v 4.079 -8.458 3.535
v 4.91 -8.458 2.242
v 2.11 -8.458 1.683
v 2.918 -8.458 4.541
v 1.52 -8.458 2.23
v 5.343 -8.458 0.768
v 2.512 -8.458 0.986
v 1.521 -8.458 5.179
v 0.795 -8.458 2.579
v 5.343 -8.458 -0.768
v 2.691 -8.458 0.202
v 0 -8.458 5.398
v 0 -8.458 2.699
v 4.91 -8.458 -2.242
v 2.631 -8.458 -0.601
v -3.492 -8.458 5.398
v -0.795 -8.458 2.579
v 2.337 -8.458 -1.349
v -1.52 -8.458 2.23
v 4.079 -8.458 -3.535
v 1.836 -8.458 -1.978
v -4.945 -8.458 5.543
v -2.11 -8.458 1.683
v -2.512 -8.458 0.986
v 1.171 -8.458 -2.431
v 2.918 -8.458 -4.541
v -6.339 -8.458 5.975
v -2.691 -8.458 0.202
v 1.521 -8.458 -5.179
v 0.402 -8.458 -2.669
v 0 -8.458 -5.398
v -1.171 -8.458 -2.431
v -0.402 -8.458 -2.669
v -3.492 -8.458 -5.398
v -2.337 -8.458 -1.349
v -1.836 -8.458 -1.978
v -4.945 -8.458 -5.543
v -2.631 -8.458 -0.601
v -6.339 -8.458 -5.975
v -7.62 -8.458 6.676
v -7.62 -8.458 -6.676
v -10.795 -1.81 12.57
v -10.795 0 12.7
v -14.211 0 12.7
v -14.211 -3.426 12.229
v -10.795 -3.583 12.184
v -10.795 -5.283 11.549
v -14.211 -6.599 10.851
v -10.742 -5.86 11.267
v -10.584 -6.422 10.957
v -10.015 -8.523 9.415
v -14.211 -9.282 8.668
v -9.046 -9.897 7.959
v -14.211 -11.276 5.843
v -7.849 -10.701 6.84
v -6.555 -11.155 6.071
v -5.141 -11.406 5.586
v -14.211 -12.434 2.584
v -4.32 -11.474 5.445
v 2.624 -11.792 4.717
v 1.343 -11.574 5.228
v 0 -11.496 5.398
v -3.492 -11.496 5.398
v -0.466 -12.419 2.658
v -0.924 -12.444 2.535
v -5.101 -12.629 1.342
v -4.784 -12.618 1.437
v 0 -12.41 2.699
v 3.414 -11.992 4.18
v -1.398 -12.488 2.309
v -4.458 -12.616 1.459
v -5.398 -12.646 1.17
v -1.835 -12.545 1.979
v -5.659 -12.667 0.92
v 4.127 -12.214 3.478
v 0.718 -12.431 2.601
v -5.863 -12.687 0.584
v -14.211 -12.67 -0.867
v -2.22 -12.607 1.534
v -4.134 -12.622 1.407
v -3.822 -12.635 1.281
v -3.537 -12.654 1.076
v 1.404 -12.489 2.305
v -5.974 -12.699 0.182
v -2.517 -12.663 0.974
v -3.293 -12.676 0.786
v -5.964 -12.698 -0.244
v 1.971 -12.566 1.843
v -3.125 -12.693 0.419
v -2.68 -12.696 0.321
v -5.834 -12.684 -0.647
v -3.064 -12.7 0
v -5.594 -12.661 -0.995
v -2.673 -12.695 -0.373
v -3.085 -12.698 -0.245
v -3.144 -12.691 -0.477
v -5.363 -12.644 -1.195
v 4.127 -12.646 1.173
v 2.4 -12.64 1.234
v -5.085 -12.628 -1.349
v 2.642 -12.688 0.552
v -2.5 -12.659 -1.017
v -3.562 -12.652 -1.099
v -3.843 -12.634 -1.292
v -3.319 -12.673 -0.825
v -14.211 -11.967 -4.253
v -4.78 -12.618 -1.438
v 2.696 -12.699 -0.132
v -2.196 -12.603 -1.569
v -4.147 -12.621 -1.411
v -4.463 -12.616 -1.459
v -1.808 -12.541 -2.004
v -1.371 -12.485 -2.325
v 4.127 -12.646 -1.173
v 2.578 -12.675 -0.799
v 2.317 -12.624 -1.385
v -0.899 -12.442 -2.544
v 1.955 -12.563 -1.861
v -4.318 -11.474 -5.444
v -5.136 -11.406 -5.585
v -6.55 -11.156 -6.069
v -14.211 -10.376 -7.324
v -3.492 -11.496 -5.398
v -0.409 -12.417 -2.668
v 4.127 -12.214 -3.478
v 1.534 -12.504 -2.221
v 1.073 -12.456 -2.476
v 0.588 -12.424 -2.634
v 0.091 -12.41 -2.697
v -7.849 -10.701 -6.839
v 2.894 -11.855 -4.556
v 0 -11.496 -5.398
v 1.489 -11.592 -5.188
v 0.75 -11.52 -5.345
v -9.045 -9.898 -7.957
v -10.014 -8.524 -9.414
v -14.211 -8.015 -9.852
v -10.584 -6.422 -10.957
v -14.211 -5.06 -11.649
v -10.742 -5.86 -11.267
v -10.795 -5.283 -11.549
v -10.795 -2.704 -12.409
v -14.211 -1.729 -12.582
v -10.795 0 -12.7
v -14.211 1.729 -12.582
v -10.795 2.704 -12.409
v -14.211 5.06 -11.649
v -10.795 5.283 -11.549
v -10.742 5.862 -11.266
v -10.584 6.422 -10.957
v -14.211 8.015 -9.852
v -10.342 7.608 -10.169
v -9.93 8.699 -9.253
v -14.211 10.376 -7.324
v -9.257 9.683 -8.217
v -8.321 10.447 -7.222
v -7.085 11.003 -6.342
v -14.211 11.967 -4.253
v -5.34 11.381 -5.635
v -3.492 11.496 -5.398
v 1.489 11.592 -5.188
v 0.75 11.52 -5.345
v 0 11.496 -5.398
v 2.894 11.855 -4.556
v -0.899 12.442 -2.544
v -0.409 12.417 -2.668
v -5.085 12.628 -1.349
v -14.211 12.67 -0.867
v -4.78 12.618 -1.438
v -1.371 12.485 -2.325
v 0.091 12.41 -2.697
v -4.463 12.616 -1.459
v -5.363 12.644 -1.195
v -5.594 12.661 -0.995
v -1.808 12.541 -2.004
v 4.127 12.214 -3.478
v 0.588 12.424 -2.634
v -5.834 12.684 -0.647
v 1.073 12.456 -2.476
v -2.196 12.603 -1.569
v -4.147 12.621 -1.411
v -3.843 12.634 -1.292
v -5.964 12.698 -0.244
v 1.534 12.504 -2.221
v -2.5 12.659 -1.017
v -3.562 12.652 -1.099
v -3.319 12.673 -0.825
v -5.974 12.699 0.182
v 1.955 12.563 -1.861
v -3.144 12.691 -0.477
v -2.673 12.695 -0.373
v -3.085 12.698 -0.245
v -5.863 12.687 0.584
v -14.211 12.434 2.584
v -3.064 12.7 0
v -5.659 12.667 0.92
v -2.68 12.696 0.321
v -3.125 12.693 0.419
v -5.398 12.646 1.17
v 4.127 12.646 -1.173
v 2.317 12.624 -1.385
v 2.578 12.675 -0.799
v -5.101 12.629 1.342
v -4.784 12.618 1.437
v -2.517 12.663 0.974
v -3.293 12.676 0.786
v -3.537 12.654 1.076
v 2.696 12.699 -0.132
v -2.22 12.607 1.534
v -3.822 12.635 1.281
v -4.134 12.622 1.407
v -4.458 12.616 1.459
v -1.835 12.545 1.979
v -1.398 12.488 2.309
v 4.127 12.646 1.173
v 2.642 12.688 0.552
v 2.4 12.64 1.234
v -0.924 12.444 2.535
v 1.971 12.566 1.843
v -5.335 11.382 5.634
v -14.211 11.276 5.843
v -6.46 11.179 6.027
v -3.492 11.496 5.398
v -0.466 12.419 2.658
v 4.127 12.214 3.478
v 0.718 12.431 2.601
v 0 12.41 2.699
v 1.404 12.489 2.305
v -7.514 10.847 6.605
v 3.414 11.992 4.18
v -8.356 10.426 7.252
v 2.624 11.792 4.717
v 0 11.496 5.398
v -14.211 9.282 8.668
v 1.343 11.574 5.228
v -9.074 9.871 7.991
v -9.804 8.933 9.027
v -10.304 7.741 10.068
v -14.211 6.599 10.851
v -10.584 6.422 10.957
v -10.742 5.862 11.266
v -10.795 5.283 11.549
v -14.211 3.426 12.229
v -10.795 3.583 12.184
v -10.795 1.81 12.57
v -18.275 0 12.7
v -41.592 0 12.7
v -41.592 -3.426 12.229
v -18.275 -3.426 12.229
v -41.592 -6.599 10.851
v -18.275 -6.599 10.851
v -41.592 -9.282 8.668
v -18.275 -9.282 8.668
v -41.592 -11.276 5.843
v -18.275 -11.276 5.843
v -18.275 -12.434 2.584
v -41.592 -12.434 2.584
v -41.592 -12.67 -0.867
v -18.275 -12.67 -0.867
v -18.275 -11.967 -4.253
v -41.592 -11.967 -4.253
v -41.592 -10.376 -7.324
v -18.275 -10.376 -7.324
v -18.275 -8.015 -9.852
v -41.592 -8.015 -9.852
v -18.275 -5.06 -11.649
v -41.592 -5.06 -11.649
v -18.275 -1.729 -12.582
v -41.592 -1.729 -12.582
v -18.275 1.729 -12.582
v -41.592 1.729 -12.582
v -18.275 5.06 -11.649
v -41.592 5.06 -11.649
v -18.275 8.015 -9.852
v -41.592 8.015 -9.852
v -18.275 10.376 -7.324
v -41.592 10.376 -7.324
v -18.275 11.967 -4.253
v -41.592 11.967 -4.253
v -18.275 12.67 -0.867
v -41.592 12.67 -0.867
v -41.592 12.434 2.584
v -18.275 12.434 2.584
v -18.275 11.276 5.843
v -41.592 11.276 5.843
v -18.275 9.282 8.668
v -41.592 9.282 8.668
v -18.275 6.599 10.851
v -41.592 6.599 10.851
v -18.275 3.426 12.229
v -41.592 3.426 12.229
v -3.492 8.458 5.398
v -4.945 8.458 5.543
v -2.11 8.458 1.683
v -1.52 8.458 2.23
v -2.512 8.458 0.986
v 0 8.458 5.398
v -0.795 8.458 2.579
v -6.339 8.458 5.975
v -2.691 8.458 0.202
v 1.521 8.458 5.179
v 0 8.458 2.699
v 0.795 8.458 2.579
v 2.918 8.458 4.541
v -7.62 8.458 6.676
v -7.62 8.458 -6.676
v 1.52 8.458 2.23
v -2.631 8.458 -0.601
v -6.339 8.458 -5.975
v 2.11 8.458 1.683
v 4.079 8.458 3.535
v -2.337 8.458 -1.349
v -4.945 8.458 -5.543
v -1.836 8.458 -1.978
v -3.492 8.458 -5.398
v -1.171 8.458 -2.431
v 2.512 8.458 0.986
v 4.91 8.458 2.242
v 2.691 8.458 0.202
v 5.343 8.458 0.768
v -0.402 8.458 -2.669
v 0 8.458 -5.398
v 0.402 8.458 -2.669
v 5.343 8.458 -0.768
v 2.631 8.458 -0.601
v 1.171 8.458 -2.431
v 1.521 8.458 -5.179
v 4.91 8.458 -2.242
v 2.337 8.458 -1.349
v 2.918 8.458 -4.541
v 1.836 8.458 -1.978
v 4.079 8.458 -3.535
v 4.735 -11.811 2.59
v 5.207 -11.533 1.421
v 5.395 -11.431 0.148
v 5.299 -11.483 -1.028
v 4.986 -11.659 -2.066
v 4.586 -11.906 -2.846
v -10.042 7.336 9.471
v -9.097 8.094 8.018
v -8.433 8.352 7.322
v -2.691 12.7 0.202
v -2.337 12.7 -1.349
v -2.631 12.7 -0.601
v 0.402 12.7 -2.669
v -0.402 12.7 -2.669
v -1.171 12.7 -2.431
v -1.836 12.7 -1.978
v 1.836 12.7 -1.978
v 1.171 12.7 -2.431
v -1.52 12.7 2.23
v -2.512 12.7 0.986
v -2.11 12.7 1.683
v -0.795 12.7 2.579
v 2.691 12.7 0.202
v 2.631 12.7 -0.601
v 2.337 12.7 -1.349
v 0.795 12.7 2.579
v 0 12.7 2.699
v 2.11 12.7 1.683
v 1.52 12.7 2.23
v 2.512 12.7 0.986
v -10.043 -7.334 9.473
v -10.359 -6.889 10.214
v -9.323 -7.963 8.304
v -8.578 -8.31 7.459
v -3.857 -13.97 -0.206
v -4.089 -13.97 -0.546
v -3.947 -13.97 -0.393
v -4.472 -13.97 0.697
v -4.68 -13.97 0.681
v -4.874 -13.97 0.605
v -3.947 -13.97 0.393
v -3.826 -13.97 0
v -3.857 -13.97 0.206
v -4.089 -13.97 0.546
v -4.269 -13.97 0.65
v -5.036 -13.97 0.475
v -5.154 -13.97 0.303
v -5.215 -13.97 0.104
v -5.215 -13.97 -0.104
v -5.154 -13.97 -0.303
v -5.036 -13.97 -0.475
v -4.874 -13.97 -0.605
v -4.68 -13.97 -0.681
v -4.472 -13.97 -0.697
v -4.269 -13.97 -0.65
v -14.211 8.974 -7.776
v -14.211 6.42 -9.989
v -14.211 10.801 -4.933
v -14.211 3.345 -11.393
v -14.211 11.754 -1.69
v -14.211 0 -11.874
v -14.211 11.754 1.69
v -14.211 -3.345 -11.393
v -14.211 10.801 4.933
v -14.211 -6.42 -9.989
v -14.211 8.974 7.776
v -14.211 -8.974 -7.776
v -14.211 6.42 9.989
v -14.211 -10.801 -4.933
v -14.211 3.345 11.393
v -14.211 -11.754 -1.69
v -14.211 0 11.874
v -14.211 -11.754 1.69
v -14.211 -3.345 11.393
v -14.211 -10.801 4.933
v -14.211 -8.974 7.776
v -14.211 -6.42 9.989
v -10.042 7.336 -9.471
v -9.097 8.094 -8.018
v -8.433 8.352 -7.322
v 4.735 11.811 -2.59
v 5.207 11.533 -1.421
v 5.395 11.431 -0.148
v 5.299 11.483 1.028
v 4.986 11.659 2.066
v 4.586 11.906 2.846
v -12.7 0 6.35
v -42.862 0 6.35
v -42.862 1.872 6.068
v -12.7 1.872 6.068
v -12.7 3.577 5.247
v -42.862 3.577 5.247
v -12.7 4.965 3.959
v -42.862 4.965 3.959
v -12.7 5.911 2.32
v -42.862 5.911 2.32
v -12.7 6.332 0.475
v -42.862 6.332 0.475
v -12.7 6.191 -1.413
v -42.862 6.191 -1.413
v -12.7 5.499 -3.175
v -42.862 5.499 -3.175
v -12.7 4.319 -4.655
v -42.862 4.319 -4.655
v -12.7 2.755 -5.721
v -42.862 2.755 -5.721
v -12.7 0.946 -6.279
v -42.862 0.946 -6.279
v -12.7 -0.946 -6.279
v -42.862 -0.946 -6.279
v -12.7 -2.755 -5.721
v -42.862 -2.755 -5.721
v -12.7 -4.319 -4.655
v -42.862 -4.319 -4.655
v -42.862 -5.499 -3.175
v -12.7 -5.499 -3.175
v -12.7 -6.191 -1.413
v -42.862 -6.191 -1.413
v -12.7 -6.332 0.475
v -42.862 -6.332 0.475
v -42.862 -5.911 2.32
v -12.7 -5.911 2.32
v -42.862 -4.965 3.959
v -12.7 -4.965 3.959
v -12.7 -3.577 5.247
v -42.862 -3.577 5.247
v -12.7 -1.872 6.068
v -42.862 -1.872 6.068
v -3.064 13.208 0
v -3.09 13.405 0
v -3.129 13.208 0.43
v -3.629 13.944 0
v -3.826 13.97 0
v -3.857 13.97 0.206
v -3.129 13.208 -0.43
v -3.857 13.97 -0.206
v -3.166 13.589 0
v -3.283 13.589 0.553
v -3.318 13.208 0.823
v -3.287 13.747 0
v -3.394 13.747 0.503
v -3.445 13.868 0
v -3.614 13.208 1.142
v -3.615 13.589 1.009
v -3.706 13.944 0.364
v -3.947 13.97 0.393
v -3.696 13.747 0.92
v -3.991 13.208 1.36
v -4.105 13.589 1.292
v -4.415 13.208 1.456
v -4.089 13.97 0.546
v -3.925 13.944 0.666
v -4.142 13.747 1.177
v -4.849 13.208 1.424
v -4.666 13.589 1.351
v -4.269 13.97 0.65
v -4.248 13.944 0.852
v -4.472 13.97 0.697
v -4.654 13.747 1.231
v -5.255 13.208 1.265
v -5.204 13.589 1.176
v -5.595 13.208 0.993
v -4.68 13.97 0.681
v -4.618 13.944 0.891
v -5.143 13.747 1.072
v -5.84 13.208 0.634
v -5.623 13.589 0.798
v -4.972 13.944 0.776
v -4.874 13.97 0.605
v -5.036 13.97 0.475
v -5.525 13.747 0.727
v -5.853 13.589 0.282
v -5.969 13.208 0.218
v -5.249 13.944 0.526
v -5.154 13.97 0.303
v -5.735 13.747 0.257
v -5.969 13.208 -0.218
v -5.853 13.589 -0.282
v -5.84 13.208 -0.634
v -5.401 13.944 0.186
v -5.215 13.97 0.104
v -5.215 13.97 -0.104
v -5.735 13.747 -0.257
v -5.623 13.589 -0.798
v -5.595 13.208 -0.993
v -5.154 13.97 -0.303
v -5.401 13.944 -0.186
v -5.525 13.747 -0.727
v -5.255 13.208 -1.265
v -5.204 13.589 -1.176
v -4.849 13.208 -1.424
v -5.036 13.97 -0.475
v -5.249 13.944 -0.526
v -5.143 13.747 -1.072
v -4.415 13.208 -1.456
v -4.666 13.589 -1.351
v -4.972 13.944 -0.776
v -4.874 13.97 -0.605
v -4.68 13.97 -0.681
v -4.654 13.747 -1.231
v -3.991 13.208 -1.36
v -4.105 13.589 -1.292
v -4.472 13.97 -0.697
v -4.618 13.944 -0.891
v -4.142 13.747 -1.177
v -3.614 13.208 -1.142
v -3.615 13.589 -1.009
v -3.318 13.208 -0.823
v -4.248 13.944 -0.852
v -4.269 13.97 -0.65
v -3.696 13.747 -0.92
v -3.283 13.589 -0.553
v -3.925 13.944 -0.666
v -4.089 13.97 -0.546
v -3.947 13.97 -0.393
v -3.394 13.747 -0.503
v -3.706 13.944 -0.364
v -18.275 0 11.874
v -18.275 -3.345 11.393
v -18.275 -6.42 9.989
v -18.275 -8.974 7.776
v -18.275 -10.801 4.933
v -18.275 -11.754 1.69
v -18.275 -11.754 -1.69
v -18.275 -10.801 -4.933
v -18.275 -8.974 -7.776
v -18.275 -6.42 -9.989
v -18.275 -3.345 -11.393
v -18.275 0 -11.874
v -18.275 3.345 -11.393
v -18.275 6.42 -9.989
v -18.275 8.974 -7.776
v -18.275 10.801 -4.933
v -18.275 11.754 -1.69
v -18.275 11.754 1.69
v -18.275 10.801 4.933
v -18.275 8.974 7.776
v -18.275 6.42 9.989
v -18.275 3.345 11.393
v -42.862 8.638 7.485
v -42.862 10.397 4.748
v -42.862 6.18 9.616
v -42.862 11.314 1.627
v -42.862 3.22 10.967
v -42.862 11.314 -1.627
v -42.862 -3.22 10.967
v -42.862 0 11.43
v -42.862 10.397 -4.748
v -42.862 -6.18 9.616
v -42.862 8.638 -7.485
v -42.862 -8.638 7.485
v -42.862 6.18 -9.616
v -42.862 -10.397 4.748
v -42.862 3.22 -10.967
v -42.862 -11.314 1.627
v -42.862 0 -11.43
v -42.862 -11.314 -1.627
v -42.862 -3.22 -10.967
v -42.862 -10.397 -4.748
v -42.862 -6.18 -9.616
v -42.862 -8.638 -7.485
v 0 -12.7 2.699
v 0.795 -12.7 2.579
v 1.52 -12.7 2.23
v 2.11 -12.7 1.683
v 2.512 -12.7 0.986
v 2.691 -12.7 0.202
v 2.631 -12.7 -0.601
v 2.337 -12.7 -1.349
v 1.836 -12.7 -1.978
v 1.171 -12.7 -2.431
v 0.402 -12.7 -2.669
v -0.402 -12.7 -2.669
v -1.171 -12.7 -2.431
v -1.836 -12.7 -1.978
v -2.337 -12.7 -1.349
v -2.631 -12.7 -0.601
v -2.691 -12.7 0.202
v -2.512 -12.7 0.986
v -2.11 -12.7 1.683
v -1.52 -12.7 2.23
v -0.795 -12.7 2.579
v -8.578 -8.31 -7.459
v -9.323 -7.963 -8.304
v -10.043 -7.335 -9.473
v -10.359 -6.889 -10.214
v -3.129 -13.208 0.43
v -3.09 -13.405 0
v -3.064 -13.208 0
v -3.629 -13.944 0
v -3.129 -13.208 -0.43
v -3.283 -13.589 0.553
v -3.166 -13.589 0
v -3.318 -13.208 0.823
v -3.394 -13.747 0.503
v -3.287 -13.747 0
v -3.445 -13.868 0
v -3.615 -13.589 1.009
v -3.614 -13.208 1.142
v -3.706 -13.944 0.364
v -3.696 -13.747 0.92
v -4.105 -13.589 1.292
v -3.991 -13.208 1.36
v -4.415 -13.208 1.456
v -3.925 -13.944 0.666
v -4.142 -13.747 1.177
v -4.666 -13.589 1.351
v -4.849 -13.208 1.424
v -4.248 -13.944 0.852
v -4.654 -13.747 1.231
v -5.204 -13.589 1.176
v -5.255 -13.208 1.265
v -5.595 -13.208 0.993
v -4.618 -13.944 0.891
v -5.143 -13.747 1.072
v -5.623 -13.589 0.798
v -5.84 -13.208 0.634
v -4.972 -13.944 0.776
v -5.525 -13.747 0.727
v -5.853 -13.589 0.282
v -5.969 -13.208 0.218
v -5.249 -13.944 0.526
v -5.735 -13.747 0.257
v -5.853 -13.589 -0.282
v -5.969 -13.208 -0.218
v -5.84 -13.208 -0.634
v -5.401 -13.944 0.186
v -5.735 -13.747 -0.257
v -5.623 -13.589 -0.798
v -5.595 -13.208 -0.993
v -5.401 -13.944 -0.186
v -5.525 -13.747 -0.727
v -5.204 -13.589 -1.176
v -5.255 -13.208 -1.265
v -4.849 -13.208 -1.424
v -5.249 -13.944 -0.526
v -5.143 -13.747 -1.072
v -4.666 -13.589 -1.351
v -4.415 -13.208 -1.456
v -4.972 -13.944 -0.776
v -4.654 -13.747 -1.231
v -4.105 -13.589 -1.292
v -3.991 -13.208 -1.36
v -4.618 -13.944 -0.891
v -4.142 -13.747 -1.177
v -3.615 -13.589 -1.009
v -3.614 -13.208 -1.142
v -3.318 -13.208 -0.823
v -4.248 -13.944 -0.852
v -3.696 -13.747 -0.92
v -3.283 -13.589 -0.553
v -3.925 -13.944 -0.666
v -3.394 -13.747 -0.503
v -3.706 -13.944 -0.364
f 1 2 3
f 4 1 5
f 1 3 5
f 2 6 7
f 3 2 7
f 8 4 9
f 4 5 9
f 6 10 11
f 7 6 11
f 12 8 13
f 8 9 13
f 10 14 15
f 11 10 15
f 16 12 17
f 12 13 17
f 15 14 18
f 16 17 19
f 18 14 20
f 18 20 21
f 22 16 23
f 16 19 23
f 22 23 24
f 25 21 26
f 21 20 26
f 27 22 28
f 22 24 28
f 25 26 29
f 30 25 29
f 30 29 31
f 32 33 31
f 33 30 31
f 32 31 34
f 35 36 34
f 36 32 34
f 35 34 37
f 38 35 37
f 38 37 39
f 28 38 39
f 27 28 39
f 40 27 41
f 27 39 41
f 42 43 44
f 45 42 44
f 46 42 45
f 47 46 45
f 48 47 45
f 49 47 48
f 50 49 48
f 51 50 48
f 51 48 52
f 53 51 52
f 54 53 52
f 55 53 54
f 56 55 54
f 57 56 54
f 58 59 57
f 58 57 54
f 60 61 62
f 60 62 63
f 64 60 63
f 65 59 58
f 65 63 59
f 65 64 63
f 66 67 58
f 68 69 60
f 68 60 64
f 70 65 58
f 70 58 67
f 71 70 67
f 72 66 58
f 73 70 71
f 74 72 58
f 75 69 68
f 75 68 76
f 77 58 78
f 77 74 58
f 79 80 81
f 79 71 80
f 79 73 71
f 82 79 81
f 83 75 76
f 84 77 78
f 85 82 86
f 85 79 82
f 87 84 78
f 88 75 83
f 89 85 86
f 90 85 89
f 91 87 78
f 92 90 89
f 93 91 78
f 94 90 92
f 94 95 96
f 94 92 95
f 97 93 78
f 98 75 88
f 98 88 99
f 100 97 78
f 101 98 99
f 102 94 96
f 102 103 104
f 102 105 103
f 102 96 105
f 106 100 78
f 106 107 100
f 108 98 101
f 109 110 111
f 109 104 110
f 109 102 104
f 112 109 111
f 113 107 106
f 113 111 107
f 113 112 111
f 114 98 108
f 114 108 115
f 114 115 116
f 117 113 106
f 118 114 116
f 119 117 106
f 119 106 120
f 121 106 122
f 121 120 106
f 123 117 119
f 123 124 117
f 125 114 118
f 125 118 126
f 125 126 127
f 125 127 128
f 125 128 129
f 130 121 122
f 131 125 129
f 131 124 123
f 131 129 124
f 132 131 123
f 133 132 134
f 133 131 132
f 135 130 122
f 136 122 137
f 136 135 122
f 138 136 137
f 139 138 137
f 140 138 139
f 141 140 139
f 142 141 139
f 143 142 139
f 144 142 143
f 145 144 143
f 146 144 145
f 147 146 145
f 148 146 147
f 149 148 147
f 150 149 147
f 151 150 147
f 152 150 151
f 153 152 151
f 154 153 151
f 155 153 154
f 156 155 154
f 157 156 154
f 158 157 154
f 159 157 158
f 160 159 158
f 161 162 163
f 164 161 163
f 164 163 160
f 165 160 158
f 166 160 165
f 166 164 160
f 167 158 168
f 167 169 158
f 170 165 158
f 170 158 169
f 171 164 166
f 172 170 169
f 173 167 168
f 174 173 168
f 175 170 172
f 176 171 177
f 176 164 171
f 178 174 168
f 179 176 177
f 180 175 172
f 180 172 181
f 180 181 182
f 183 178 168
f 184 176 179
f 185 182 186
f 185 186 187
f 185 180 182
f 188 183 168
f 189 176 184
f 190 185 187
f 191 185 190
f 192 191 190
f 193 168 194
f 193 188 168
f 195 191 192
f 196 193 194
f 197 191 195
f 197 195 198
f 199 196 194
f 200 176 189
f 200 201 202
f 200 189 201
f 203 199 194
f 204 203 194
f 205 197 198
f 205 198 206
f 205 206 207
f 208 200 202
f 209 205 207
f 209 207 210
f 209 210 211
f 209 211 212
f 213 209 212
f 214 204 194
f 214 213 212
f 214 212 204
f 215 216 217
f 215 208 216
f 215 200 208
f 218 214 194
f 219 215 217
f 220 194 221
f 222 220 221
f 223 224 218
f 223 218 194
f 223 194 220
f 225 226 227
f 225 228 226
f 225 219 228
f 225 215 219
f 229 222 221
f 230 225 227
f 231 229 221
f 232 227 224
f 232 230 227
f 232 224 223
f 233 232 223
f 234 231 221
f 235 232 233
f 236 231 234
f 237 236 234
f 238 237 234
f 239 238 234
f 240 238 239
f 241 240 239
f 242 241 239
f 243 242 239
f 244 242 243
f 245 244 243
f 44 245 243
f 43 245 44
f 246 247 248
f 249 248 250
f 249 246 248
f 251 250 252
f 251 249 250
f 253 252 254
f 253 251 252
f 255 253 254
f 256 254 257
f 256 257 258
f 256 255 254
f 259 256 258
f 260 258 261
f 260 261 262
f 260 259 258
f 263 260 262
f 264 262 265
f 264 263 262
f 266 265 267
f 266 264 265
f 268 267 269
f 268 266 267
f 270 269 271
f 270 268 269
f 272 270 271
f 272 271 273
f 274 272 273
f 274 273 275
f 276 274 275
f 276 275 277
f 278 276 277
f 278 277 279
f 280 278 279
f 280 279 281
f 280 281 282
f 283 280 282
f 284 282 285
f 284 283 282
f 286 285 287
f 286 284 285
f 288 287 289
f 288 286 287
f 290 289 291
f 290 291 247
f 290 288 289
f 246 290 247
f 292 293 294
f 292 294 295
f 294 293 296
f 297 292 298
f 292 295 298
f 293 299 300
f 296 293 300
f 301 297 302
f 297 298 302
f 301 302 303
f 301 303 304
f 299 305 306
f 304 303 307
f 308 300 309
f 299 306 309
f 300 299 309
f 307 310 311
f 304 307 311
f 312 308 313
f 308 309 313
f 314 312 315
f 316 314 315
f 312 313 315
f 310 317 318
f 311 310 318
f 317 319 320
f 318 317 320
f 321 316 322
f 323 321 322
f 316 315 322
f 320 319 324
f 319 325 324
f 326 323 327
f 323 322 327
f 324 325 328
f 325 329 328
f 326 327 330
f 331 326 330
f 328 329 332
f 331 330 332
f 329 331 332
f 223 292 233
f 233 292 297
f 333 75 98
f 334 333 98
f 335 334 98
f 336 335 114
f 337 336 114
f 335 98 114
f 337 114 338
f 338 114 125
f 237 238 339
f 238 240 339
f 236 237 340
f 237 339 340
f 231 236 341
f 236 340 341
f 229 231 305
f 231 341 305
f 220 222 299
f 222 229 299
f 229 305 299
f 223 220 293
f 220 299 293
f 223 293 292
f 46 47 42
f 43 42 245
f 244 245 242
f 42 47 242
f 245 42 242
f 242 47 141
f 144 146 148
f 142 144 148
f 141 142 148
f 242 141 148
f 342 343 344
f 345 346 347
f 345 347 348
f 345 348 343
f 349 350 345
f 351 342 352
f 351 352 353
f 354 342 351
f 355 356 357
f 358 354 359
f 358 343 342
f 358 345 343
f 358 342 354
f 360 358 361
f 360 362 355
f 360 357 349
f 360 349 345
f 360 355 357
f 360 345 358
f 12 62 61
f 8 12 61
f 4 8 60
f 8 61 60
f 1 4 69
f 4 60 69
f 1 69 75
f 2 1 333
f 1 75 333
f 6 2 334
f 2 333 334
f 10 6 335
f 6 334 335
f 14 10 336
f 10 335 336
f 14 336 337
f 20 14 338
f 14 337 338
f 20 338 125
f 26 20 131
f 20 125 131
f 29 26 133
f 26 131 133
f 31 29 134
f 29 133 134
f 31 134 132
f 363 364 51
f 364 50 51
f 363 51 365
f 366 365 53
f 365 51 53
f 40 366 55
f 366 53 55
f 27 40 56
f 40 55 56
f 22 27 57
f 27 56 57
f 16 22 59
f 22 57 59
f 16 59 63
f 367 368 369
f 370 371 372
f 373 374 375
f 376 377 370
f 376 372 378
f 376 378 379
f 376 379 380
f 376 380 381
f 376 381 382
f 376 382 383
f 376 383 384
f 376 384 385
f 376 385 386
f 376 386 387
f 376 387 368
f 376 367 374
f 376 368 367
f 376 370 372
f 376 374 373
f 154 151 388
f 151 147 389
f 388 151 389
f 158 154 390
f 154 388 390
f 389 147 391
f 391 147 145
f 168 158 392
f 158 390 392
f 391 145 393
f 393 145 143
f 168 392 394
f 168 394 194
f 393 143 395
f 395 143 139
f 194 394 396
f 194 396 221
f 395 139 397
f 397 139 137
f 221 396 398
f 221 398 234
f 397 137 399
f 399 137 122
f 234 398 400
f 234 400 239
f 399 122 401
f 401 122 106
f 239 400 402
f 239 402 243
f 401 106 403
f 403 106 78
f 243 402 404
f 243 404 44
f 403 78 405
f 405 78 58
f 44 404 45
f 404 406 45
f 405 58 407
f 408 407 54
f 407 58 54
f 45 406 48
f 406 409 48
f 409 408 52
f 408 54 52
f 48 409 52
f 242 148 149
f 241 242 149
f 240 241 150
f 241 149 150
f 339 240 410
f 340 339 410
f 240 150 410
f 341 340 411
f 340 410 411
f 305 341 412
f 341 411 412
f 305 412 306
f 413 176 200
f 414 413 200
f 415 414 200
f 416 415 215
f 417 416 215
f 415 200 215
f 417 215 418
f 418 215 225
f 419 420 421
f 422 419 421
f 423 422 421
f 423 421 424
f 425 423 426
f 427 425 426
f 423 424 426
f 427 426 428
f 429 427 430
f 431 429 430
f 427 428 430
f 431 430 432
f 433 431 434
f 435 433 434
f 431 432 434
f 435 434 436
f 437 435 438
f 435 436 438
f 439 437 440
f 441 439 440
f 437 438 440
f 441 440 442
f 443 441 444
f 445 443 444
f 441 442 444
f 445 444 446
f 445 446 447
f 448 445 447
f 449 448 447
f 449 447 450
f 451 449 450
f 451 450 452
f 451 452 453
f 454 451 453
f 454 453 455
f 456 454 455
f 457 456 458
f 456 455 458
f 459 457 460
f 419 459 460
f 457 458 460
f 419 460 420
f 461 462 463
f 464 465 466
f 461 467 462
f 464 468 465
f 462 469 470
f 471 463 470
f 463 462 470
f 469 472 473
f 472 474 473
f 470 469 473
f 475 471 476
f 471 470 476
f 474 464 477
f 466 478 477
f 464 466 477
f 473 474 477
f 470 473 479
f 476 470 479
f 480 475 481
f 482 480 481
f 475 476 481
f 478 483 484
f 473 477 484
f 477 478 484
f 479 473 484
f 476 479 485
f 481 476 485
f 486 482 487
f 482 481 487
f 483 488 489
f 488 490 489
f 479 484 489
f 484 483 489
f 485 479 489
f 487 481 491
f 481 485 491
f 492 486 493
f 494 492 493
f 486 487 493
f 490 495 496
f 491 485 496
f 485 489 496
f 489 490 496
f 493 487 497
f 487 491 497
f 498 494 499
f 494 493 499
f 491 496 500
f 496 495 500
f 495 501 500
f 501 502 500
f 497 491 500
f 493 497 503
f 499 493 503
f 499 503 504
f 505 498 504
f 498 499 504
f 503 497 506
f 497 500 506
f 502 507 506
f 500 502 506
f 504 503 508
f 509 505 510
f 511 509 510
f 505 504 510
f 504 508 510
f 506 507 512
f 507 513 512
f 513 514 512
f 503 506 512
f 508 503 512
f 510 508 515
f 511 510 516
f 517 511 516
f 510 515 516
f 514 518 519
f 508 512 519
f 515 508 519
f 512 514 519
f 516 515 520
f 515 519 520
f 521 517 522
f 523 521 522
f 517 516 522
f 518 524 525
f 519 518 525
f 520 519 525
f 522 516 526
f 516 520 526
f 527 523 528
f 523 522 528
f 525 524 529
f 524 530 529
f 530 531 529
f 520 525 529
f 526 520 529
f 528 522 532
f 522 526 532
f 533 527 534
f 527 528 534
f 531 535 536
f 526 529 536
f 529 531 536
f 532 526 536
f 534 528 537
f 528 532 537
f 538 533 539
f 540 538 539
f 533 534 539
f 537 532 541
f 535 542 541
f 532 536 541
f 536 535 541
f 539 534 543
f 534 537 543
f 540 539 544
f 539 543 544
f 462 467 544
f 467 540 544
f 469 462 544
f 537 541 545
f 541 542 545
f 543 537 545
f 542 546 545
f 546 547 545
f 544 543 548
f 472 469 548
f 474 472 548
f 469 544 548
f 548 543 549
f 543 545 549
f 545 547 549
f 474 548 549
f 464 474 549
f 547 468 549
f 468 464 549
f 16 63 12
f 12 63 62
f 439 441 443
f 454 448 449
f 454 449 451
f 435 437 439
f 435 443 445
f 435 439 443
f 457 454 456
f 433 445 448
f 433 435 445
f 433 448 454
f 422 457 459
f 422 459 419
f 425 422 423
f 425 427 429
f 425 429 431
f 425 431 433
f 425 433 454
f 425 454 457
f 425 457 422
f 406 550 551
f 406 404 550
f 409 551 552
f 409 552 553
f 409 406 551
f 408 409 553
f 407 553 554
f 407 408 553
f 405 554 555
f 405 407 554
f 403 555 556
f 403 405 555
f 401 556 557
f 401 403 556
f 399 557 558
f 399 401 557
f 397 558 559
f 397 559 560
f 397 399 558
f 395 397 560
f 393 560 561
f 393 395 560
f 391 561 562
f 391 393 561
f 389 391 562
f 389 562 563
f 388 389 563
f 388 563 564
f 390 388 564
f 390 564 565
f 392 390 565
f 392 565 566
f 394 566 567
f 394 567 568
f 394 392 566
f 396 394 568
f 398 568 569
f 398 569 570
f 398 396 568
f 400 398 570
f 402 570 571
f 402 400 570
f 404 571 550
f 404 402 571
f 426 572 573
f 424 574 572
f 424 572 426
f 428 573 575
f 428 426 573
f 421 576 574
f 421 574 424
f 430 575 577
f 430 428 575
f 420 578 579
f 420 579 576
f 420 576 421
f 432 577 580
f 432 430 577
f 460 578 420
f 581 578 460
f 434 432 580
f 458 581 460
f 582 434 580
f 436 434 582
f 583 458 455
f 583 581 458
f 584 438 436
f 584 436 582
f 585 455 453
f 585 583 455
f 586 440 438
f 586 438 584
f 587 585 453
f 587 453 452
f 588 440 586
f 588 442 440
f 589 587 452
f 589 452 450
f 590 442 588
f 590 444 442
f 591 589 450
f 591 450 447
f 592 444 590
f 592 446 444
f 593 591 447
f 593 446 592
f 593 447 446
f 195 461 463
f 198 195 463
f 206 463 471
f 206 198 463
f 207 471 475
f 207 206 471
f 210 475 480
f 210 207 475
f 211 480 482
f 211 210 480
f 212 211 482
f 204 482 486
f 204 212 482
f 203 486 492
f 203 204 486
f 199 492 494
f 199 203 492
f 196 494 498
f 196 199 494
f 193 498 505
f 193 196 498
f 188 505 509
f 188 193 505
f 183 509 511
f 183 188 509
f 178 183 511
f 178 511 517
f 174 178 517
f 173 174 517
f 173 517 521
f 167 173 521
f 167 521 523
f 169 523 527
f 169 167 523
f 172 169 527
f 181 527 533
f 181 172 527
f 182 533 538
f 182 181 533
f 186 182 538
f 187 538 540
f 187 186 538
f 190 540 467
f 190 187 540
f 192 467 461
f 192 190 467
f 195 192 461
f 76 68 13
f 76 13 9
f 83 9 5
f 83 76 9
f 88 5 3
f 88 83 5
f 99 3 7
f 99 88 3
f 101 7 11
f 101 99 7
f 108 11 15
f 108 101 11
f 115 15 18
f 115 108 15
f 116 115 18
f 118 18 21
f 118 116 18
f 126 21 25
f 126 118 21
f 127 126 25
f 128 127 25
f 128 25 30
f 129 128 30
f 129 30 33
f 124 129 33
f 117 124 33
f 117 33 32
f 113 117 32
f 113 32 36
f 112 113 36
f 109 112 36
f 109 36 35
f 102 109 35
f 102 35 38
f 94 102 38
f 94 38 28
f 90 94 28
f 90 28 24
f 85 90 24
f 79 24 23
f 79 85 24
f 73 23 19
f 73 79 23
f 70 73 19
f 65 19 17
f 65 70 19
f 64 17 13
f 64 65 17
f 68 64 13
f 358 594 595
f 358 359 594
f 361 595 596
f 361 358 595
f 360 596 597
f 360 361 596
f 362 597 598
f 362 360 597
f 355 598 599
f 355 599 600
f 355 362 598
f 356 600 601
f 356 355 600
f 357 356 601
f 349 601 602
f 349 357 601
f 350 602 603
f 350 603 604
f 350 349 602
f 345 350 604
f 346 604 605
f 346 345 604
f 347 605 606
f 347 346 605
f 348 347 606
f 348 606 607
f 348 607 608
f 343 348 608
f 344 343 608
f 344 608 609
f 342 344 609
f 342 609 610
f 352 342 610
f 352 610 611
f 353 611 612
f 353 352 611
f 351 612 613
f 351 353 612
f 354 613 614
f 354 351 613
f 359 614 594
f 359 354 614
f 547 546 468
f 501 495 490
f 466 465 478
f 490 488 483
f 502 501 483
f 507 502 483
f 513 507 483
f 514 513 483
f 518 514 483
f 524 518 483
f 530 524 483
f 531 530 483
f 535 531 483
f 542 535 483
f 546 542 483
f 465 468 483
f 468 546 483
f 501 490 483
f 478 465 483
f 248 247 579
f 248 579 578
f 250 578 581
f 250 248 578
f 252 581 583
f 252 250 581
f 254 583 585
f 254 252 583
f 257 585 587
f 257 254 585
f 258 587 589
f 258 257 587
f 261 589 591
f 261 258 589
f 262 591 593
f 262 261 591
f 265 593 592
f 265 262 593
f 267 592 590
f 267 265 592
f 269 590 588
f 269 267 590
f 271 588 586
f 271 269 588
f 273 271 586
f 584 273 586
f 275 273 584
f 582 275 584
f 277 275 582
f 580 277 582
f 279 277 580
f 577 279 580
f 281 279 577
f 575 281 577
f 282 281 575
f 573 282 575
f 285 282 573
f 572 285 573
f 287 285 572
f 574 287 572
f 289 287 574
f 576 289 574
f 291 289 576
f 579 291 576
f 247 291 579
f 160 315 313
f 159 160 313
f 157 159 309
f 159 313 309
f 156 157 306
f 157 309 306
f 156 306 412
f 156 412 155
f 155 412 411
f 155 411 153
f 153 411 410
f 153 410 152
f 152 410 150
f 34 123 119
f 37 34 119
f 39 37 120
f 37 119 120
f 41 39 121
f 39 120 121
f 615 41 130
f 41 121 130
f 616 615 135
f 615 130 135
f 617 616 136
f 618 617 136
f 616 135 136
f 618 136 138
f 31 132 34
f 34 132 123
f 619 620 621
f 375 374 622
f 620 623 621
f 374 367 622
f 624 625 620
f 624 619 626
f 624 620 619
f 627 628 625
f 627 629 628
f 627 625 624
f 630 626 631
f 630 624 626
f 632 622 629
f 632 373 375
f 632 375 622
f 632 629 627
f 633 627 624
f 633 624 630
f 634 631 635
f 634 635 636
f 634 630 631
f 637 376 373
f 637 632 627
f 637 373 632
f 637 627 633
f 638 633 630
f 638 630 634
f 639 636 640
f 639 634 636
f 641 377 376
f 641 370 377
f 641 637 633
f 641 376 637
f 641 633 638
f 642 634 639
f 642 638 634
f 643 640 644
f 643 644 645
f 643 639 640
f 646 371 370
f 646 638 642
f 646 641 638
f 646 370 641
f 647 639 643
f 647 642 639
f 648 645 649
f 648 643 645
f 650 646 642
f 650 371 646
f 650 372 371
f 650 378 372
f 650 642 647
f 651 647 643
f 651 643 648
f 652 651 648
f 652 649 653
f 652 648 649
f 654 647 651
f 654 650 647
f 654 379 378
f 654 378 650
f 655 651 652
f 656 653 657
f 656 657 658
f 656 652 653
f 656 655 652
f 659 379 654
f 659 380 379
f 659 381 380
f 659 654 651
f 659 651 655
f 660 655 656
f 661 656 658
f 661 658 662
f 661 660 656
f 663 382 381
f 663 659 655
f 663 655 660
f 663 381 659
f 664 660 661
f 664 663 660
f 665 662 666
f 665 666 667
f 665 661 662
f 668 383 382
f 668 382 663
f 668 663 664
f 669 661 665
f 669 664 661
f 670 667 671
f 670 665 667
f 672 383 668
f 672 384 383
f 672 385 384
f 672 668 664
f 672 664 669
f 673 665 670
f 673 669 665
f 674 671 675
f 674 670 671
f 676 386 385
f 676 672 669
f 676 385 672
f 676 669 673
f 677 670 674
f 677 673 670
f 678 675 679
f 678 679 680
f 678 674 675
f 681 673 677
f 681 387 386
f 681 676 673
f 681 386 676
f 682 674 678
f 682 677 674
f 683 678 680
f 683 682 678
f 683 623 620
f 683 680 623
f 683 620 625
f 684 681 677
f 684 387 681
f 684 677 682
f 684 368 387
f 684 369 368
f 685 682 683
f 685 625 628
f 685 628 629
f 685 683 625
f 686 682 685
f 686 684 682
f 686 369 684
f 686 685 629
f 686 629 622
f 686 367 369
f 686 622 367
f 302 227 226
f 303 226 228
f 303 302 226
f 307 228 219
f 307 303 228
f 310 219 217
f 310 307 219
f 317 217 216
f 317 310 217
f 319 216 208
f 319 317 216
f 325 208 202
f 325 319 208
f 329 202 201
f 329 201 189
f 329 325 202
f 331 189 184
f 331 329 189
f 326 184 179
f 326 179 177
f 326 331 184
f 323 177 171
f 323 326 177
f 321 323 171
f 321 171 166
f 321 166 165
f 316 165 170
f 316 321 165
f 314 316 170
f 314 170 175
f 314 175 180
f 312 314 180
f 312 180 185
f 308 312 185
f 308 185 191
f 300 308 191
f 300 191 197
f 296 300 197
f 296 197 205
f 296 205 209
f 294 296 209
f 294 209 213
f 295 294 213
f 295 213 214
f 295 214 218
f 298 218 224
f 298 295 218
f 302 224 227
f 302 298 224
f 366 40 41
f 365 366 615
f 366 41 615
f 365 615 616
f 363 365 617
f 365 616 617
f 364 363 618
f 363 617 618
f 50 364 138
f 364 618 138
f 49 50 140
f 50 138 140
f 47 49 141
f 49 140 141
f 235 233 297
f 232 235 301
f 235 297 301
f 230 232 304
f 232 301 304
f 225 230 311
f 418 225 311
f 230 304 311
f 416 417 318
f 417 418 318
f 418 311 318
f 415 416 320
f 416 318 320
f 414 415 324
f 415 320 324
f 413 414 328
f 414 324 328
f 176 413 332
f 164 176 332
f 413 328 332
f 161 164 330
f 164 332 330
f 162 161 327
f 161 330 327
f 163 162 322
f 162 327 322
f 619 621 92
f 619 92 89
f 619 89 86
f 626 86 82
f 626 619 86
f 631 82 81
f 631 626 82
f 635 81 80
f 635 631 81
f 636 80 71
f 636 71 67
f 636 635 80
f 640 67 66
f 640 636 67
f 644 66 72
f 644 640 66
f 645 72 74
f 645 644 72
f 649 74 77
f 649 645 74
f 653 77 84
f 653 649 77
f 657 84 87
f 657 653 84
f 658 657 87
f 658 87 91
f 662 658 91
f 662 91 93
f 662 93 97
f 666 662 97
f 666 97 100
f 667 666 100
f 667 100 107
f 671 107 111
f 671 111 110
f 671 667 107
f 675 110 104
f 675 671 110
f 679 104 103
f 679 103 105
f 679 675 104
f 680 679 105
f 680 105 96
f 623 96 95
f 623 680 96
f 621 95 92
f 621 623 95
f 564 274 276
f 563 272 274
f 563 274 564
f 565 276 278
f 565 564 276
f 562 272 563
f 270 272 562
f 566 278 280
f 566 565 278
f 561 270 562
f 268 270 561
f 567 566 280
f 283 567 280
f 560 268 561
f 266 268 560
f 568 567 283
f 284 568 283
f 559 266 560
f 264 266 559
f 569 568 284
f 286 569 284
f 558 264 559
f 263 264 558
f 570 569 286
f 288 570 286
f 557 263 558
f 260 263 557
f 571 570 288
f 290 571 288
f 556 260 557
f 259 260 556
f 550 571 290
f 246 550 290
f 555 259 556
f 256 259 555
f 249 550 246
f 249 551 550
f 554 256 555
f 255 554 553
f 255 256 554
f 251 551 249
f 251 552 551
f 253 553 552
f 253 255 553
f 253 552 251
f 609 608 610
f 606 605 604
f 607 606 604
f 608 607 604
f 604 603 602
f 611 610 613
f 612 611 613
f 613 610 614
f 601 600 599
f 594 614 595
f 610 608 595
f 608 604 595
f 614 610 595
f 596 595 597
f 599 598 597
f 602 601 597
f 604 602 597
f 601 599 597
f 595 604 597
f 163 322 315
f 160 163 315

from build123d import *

# Parameters (mm, degrees)
SKETCH1_W               = 48.26
SKETCH1_H               = 12.7
CHAMFER1_SIZE           = 1.27
EXTRUDE1_DEPTH          = 47.473367709
EXTRUDE1_DEPTH_BACK     = 47.473367709
SKETCH4_R               = 6.35
EXTRUDE4_DEPTH          = 30.1625
EXTRUDE3_DEPTH          = 47.473367764
EXTRUDE3_DEPTH_BACK     = 47.473367764
EXTRUDE6_DEPTH          = 47.473367764
EXTRUDE6_DEPTH_BACK     = 47.473367764
SKETCH6_R               = 2.69875
SKETCH21_R              = 1.4605
BOSS_EXTRUDE1_DEPTH     = 13.97
FILLET1_R               = 0.762
CUT_EXTRUDE3_DEPTH      = 47.836362066
CUT_EXTRUDE3_DEPTH_BACK = 47.836362066
SKETCH23_W              = 4.064
SKETCH23_H              = 0.8255
SKETCH14_R              = 2.69875
EXTRUDE14_DEPTH         = 12.7


with BuildPart() as part:
    # Sketch1 → Revolve1 (revolve)
    with BuildSketch(Plane(origin=(0, 0, 0), x_dir=(1, 0, 0), z_dir=(0, 1, 0)), mode=Mode.PRIVATE) as revolve1_sk:
        with Locations((-18.7325, 6.35)):
            Rectangle(SKETCH1_W, SKETCH1_H)
    revolve(revolve1_sk.sketch.rotate(Axis((-42.8625, 0, 0), (1, 0, 0)), 180), axis=Axis((-42.8625, 0, 0), (1, 0, 0)))

    # Chamfer1
    chamfer1_edges = [part.edges().sort_by_distance(p)[0] for p in [
        (5.3975, 0, -12.7),
        (-42.8625, 0, -12.7),
    ]]
    chamfer(chamfer1_edges, length=CHAMFER1_SIZE)

    # Sketch2 → Extrude1 (cut, two sides: drawn at the far end of the back side and taken through both)
    with BuildSketch(Plane(origin=(0, 0, 0), x_dir=(1, 0, 0), z_dir=(0, 1, 0)).offset(-EXTRUDE1_DEPTH_BACK)):
        with BuildLine():
            Line((-10.795, 12.7), (10.795, 12.7))
            Line((10.795, 12.7), (10.795, -12.7))
            Line((10.795, -12.7), (-10.795, -12.7))
            ThreePointArc((-10.795, -12.7), (-8.65614727, -7.53635273), (-3.4925, -5.3975))
            Line((-3.4925, -5.3975), (0, -5.3975))
            ThreePointArc((0, -5.3975), (5.3975, 0), (0, 5.3975))
            Line((0, 5.3975), (-3.4925, 5.3975))
            ThreePointArc((-3.4925, 5.3975), (-8.65614727, 7.53635273), (-10.795, 12.7))
        make_face()
    extrude(amount=EXTRUDE1_DEPTH + EXTRUDE1_DEPTH_BACK, mode=Mode.SUBTRACT)

    # Sketch4 → Extrude4 (cut)
    with BuildSketch(Plane.ZY.offset(42.8625)):
        Circle(SKETCH4_R)
    extrude(amount=-EXTRUDE4_DEPTH, mode=Mode.SUBTRACT)

    # Sketch3 → Extrude3 (cut, two sides: drawn at the far end of the back side and taken through both)
    with BuildSketch(Plane.XY.offset(-EXTRUDE3_DEPTH_BACK)):
        with BuildLine():
            Line((-7.62, 8.4582), (10.795, 8.4582))
            Line((10.795, 8.4582), (10.795, -8.4582))
            Line((10.795, -8.4582), (-7.62, -8.4582))
            ThreePointArc((-7.62, -8.4582), (-9.86506403, -7.52826403), (-10.795, -5.2832))
            Line((-10.795, -5.2832), (-10.795, 5.2832))
            ThreePointArc((-10.795, 5.2832), (-9.86506403, 7.52826403), (-7.62, 8.4582))
        make_face()
    extrude(amount=EXTRUDE3_DEPTH + EXTRUDE3_DEPTH_BACK, mode=Mode.SUBTRACT)

    # Sketch6 → Extrude6 (cut, two sides: drawn at the far end of the back side and taken through both)
    with BuildSketch(Plane(origin=(0, 0, 0), x_dir=(1, 0, 0), z_dir=(0, 1, 0)).offset(-EXTRUDE6_DEPTH_BACK)):
        with Locations(Location((0, 0, 0), (0, 0, 270))):
            Circle(SKETCH6_R)
    extrude(amount=EXTRUDE6_DEPTH + EXTRUDE6_DEPTH_BACK, mode=Mode.SUBTRACT)

    # Sketch21 → Boss-Extrude1 (add, symmetric)
    with BuildSketch(Plane.XZ):
        with Locations((-4.524375, 0)):
            Circle(SKETCH21_R)
    extrude(amount=BOSS_EXTRUDE1_DEPTH, both=True)

    # Fillet1
    fillet1_edges = [part.edges().sort_by_distance(p)[0] for p in [
        (-5.984875, 13.97, 0),
        (-5.984875, -13.97, 0),
    ]]
    fillet(fillet1_edges, radius=FILLET1_R)

    # Sketch22 → Cut-Extrude3 (cut, two sides: drawn at the far end of the back side and taken through both)
    with BuildSketch(Plane.XY.offset(-CUT_EXTRUDE3_DEPTH_BACK)):
        with BuildLine():
            Line((10.795, 8.4582), (-7.62, 8.4582))
            ThreePointArc((-7.62, 8.4582), (-9.86506403, 7.52826403), (-10.795, 5.2832))
            Line((-10.795, 5.2832), (-10.795, -5.2832))
            ThreePointArc((-10.795, -5.2832), (-9.86506403, -7.52826403), (-7.62, -8.4582))
            Line((-7.62, -8.4582), (10.795, -8.4582))
            Line((10.795, -8.4582), (10.795, 8.4582))
        make_face()
    extrude(amount=CUT_EXTRUDE3_DEPTH + CUT_EXTRUDE3_DEPTH_BACK, mode=Mode.SUBTRACT)

    # Sketch23 → Cut-Revolve1 (revolve, cut)
    with BuildSketch(Plane(origin=(0, 0, 0), x_dir=(1, 0, 0), z_dir=(0, 1, 0))):
        with Locations((-16.2433, -12.28725)):
            Rectangle(SKETCH23_W, SKETCH23_H)
    revolve(axis=Axis((-42.8625, 0, 0), (1, 0, 0)), mode=Mode.SUBTRACT)


with BuildPart() as body_2:
    # Sketch14 → Extrude14 (new, symmetric)
    with BuildSketch(Plane(origin=(0, 0, 0), x_dir=(1, 0, 0), z_dir=(0, 1, 0))):
        with Locations(Location((0, 0, 0), (0, 0, 270))):
            Circle(SKETCH14_R)
    extrude(amount=EXTRUDE14_DEPTH, both=True)


solid = Compound([part.part, body_2.part])
